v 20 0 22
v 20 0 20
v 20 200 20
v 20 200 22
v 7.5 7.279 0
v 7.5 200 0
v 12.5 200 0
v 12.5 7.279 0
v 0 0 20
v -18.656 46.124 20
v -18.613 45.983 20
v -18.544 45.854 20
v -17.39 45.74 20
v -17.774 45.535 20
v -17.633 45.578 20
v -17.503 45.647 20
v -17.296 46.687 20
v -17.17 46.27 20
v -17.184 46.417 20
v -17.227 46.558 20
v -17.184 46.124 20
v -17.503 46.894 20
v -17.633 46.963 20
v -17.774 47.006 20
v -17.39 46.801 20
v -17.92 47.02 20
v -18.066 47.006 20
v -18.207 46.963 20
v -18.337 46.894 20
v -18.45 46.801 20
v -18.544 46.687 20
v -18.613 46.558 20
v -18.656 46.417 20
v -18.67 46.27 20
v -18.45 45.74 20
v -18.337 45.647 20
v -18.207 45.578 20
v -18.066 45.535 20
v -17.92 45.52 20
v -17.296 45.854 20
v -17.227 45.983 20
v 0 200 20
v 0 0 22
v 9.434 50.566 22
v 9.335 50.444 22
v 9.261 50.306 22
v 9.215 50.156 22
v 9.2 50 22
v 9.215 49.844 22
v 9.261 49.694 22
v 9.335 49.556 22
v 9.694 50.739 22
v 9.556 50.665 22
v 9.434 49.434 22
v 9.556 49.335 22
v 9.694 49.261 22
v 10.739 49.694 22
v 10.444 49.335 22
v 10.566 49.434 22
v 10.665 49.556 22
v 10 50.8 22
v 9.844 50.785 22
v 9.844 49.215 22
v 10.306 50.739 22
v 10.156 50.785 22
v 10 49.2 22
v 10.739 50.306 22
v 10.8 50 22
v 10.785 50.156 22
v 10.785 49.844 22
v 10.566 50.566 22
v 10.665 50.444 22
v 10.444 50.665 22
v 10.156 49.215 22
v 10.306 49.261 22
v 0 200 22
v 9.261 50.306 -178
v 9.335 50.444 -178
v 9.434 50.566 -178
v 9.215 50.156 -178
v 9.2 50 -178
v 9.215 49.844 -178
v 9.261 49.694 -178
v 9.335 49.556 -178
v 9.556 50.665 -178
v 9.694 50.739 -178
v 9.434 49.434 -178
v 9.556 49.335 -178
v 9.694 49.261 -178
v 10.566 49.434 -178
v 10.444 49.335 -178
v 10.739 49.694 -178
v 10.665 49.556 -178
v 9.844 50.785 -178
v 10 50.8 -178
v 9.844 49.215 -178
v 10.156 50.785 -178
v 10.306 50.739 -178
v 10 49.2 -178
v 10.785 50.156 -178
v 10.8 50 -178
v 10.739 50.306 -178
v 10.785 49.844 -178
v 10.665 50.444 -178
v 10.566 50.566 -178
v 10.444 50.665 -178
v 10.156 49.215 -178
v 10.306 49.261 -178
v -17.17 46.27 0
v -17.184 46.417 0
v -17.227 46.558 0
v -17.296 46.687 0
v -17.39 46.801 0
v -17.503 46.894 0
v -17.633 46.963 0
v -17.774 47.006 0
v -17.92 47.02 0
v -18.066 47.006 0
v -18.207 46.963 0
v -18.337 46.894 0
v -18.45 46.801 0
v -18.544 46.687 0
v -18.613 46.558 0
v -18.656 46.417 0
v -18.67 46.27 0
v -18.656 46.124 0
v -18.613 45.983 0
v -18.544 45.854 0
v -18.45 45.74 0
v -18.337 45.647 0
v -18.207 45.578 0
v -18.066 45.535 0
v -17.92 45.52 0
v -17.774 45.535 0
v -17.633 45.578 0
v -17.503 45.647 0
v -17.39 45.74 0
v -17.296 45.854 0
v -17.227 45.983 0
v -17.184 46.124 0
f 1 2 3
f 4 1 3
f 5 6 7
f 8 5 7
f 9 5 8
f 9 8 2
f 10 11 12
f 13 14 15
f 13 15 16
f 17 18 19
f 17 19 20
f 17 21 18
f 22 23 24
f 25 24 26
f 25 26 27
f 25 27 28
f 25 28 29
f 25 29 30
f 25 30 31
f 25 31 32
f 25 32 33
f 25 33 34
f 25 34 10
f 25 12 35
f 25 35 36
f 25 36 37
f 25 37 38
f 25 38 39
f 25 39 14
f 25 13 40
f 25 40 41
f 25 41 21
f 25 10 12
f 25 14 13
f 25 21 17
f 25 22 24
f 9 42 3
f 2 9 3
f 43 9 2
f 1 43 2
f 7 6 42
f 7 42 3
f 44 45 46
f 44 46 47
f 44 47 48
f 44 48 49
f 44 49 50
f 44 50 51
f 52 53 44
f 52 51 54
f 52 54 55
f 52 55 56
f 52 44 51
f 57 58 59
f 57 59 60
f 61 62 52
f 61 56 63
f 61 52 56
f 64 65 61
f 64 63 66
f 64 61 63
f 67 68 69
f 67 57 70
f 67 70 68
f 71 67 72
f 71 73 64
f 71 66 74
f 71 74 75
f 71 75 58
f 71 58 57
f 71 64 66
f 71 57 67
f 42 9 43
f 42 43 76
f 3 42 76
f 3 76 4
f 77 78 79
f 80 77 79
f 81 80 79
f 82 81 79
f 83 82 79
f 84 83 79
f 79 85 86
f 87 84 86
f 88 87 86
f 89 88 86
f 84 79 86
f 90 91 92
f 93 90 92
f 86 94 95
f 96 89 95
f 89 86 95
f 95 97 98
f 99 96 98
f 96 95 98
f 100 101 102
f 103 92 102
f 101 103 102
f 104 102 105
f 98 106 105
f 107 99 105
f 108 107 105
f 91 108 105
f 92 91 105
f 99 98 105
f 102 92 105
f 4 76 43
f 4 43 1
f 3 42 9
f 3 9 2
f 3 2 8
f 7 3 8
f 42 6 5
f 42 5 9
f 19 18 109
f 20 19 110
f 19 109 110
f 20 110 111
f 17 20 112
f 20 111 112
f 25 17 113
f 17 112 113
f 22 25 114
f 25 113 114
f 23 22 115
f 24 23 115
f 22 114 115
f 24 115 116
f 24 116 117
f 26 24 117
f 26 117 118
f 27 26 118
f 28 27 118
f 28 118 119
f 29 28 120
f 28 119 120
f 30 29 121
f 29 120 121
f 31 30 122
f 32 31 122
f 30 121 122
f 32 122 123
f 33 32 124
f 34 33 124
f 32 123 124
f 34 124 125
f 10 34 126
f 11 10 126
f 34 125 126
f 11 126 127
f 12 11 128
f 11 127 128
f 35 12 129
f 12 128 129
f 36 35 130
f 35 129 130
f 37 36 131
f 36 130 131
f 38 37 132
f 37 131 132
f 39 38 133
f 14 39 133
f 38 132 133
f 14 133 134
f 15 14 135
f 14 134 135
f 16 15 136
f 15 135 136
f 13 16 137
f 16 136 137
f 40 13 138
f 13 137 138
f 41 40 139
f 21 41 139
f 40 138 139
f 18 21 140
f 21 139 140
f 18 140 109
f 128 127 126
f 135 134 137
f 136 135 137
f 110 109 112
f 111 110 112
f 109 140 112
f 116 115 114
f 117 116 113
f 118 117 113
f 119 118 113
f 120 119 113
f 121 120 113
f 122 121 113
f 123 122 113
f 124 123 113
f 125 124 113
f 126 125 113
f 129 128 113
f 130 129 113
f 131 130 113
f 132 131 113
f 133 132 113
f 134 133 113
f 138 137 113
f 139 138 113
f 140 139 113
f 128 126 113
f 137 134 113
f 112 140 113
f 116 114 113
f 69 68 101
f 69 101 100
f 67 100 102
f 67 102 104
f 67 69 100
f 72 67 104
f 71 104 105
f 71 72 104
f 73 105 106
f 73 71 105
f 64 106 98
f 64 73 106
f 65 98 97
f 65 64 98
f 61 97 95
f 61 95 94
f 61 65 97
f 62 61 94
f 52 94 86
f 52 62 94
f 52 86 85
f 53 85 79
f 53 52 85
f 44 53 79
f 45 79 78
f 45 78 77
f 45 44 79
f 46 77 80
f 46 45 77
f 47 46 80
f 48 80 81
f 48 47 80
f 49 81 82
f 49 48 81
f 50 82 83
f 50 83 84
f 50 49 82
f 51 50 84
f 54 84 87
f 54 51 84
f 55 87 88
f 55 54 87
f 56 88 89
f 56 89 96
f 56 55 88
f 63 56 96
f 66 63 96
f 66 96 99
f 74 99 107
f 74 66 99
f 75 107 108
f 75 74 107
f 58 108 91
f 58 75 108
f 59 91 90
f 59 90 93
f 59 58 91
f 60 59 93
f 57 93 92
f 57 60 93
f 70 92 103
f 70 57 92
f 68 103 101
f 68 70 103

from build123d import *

# Parameters (mm, degrees)
F0_W      = 20
F0_H      = 200
F1_DEPTH  = 20
F3_DEPTH  = 200.001
F5_DEPTH  = 20.001
F6_W      = 20
F6_H      = 200
F7_DEPTH  = 2
F8_R      = 0.8
F9_DEPTH  = 200
F10_R     = 0.75
F11_DEPTH = 20


with BuildPart() as f1:
    # F0 (on Top) → F1 (new body)
    with BuildSketch(Plane.XY):
        with Locations((10, 100)):
            Rectangle(F0_W, F0_H)
    extrude(amount=F1_DEPTH)

    # F2 (on face) → F3 (cut, through all)
    with BuildSketch(Plane.XZ):
        Polygon((7.5, 0), (0, 20), (0, 0), align=None)
        Polygon((20, 20), (12.5, 0), (20, 0), align=None)
    extrude(amount=-F3_DEPTH, mode=Mode.SUBTRACT)

    # F4 (on Right) → F5 (cut, through all)
    with BuildSketch(Plane.YZ):
        Polygon((0, 20), (0, 0), (7.2794046853, 0), align=None)
    extrude(amount=F5_DEPTH, mode=Mode.SUBTRACT)


with BuildPart() as f7:
    # F6 (on face) → F7 (new body)
    with BuildSketch(Plane.XY.offset(20)):
        with Locations((10, 100)):
            Rectangle(F6_W, F6_H)
    extrude(amount=F7_DEPTH)


with BuildPart() as f9:
    # F8 (on face) → F9 (new body)
    with BuildSketch(Plane.XY.offset(22)):
        with Locations((10, 50)):
            Circle(F8_R)
    extrude(amount=-F9_DEPTH)


with BuildPart() as f11:
    # F10 (on Top) → F11 (new body)
    with BuildSketch(Plane.XY):
        with Locations((-17.920082435, 46.270493418)):
            Circle(F10_R)
    extrude(amount=F11_DEPTH)


solid = Compound([f1.part, f7.part, f9.part, f11.part])
